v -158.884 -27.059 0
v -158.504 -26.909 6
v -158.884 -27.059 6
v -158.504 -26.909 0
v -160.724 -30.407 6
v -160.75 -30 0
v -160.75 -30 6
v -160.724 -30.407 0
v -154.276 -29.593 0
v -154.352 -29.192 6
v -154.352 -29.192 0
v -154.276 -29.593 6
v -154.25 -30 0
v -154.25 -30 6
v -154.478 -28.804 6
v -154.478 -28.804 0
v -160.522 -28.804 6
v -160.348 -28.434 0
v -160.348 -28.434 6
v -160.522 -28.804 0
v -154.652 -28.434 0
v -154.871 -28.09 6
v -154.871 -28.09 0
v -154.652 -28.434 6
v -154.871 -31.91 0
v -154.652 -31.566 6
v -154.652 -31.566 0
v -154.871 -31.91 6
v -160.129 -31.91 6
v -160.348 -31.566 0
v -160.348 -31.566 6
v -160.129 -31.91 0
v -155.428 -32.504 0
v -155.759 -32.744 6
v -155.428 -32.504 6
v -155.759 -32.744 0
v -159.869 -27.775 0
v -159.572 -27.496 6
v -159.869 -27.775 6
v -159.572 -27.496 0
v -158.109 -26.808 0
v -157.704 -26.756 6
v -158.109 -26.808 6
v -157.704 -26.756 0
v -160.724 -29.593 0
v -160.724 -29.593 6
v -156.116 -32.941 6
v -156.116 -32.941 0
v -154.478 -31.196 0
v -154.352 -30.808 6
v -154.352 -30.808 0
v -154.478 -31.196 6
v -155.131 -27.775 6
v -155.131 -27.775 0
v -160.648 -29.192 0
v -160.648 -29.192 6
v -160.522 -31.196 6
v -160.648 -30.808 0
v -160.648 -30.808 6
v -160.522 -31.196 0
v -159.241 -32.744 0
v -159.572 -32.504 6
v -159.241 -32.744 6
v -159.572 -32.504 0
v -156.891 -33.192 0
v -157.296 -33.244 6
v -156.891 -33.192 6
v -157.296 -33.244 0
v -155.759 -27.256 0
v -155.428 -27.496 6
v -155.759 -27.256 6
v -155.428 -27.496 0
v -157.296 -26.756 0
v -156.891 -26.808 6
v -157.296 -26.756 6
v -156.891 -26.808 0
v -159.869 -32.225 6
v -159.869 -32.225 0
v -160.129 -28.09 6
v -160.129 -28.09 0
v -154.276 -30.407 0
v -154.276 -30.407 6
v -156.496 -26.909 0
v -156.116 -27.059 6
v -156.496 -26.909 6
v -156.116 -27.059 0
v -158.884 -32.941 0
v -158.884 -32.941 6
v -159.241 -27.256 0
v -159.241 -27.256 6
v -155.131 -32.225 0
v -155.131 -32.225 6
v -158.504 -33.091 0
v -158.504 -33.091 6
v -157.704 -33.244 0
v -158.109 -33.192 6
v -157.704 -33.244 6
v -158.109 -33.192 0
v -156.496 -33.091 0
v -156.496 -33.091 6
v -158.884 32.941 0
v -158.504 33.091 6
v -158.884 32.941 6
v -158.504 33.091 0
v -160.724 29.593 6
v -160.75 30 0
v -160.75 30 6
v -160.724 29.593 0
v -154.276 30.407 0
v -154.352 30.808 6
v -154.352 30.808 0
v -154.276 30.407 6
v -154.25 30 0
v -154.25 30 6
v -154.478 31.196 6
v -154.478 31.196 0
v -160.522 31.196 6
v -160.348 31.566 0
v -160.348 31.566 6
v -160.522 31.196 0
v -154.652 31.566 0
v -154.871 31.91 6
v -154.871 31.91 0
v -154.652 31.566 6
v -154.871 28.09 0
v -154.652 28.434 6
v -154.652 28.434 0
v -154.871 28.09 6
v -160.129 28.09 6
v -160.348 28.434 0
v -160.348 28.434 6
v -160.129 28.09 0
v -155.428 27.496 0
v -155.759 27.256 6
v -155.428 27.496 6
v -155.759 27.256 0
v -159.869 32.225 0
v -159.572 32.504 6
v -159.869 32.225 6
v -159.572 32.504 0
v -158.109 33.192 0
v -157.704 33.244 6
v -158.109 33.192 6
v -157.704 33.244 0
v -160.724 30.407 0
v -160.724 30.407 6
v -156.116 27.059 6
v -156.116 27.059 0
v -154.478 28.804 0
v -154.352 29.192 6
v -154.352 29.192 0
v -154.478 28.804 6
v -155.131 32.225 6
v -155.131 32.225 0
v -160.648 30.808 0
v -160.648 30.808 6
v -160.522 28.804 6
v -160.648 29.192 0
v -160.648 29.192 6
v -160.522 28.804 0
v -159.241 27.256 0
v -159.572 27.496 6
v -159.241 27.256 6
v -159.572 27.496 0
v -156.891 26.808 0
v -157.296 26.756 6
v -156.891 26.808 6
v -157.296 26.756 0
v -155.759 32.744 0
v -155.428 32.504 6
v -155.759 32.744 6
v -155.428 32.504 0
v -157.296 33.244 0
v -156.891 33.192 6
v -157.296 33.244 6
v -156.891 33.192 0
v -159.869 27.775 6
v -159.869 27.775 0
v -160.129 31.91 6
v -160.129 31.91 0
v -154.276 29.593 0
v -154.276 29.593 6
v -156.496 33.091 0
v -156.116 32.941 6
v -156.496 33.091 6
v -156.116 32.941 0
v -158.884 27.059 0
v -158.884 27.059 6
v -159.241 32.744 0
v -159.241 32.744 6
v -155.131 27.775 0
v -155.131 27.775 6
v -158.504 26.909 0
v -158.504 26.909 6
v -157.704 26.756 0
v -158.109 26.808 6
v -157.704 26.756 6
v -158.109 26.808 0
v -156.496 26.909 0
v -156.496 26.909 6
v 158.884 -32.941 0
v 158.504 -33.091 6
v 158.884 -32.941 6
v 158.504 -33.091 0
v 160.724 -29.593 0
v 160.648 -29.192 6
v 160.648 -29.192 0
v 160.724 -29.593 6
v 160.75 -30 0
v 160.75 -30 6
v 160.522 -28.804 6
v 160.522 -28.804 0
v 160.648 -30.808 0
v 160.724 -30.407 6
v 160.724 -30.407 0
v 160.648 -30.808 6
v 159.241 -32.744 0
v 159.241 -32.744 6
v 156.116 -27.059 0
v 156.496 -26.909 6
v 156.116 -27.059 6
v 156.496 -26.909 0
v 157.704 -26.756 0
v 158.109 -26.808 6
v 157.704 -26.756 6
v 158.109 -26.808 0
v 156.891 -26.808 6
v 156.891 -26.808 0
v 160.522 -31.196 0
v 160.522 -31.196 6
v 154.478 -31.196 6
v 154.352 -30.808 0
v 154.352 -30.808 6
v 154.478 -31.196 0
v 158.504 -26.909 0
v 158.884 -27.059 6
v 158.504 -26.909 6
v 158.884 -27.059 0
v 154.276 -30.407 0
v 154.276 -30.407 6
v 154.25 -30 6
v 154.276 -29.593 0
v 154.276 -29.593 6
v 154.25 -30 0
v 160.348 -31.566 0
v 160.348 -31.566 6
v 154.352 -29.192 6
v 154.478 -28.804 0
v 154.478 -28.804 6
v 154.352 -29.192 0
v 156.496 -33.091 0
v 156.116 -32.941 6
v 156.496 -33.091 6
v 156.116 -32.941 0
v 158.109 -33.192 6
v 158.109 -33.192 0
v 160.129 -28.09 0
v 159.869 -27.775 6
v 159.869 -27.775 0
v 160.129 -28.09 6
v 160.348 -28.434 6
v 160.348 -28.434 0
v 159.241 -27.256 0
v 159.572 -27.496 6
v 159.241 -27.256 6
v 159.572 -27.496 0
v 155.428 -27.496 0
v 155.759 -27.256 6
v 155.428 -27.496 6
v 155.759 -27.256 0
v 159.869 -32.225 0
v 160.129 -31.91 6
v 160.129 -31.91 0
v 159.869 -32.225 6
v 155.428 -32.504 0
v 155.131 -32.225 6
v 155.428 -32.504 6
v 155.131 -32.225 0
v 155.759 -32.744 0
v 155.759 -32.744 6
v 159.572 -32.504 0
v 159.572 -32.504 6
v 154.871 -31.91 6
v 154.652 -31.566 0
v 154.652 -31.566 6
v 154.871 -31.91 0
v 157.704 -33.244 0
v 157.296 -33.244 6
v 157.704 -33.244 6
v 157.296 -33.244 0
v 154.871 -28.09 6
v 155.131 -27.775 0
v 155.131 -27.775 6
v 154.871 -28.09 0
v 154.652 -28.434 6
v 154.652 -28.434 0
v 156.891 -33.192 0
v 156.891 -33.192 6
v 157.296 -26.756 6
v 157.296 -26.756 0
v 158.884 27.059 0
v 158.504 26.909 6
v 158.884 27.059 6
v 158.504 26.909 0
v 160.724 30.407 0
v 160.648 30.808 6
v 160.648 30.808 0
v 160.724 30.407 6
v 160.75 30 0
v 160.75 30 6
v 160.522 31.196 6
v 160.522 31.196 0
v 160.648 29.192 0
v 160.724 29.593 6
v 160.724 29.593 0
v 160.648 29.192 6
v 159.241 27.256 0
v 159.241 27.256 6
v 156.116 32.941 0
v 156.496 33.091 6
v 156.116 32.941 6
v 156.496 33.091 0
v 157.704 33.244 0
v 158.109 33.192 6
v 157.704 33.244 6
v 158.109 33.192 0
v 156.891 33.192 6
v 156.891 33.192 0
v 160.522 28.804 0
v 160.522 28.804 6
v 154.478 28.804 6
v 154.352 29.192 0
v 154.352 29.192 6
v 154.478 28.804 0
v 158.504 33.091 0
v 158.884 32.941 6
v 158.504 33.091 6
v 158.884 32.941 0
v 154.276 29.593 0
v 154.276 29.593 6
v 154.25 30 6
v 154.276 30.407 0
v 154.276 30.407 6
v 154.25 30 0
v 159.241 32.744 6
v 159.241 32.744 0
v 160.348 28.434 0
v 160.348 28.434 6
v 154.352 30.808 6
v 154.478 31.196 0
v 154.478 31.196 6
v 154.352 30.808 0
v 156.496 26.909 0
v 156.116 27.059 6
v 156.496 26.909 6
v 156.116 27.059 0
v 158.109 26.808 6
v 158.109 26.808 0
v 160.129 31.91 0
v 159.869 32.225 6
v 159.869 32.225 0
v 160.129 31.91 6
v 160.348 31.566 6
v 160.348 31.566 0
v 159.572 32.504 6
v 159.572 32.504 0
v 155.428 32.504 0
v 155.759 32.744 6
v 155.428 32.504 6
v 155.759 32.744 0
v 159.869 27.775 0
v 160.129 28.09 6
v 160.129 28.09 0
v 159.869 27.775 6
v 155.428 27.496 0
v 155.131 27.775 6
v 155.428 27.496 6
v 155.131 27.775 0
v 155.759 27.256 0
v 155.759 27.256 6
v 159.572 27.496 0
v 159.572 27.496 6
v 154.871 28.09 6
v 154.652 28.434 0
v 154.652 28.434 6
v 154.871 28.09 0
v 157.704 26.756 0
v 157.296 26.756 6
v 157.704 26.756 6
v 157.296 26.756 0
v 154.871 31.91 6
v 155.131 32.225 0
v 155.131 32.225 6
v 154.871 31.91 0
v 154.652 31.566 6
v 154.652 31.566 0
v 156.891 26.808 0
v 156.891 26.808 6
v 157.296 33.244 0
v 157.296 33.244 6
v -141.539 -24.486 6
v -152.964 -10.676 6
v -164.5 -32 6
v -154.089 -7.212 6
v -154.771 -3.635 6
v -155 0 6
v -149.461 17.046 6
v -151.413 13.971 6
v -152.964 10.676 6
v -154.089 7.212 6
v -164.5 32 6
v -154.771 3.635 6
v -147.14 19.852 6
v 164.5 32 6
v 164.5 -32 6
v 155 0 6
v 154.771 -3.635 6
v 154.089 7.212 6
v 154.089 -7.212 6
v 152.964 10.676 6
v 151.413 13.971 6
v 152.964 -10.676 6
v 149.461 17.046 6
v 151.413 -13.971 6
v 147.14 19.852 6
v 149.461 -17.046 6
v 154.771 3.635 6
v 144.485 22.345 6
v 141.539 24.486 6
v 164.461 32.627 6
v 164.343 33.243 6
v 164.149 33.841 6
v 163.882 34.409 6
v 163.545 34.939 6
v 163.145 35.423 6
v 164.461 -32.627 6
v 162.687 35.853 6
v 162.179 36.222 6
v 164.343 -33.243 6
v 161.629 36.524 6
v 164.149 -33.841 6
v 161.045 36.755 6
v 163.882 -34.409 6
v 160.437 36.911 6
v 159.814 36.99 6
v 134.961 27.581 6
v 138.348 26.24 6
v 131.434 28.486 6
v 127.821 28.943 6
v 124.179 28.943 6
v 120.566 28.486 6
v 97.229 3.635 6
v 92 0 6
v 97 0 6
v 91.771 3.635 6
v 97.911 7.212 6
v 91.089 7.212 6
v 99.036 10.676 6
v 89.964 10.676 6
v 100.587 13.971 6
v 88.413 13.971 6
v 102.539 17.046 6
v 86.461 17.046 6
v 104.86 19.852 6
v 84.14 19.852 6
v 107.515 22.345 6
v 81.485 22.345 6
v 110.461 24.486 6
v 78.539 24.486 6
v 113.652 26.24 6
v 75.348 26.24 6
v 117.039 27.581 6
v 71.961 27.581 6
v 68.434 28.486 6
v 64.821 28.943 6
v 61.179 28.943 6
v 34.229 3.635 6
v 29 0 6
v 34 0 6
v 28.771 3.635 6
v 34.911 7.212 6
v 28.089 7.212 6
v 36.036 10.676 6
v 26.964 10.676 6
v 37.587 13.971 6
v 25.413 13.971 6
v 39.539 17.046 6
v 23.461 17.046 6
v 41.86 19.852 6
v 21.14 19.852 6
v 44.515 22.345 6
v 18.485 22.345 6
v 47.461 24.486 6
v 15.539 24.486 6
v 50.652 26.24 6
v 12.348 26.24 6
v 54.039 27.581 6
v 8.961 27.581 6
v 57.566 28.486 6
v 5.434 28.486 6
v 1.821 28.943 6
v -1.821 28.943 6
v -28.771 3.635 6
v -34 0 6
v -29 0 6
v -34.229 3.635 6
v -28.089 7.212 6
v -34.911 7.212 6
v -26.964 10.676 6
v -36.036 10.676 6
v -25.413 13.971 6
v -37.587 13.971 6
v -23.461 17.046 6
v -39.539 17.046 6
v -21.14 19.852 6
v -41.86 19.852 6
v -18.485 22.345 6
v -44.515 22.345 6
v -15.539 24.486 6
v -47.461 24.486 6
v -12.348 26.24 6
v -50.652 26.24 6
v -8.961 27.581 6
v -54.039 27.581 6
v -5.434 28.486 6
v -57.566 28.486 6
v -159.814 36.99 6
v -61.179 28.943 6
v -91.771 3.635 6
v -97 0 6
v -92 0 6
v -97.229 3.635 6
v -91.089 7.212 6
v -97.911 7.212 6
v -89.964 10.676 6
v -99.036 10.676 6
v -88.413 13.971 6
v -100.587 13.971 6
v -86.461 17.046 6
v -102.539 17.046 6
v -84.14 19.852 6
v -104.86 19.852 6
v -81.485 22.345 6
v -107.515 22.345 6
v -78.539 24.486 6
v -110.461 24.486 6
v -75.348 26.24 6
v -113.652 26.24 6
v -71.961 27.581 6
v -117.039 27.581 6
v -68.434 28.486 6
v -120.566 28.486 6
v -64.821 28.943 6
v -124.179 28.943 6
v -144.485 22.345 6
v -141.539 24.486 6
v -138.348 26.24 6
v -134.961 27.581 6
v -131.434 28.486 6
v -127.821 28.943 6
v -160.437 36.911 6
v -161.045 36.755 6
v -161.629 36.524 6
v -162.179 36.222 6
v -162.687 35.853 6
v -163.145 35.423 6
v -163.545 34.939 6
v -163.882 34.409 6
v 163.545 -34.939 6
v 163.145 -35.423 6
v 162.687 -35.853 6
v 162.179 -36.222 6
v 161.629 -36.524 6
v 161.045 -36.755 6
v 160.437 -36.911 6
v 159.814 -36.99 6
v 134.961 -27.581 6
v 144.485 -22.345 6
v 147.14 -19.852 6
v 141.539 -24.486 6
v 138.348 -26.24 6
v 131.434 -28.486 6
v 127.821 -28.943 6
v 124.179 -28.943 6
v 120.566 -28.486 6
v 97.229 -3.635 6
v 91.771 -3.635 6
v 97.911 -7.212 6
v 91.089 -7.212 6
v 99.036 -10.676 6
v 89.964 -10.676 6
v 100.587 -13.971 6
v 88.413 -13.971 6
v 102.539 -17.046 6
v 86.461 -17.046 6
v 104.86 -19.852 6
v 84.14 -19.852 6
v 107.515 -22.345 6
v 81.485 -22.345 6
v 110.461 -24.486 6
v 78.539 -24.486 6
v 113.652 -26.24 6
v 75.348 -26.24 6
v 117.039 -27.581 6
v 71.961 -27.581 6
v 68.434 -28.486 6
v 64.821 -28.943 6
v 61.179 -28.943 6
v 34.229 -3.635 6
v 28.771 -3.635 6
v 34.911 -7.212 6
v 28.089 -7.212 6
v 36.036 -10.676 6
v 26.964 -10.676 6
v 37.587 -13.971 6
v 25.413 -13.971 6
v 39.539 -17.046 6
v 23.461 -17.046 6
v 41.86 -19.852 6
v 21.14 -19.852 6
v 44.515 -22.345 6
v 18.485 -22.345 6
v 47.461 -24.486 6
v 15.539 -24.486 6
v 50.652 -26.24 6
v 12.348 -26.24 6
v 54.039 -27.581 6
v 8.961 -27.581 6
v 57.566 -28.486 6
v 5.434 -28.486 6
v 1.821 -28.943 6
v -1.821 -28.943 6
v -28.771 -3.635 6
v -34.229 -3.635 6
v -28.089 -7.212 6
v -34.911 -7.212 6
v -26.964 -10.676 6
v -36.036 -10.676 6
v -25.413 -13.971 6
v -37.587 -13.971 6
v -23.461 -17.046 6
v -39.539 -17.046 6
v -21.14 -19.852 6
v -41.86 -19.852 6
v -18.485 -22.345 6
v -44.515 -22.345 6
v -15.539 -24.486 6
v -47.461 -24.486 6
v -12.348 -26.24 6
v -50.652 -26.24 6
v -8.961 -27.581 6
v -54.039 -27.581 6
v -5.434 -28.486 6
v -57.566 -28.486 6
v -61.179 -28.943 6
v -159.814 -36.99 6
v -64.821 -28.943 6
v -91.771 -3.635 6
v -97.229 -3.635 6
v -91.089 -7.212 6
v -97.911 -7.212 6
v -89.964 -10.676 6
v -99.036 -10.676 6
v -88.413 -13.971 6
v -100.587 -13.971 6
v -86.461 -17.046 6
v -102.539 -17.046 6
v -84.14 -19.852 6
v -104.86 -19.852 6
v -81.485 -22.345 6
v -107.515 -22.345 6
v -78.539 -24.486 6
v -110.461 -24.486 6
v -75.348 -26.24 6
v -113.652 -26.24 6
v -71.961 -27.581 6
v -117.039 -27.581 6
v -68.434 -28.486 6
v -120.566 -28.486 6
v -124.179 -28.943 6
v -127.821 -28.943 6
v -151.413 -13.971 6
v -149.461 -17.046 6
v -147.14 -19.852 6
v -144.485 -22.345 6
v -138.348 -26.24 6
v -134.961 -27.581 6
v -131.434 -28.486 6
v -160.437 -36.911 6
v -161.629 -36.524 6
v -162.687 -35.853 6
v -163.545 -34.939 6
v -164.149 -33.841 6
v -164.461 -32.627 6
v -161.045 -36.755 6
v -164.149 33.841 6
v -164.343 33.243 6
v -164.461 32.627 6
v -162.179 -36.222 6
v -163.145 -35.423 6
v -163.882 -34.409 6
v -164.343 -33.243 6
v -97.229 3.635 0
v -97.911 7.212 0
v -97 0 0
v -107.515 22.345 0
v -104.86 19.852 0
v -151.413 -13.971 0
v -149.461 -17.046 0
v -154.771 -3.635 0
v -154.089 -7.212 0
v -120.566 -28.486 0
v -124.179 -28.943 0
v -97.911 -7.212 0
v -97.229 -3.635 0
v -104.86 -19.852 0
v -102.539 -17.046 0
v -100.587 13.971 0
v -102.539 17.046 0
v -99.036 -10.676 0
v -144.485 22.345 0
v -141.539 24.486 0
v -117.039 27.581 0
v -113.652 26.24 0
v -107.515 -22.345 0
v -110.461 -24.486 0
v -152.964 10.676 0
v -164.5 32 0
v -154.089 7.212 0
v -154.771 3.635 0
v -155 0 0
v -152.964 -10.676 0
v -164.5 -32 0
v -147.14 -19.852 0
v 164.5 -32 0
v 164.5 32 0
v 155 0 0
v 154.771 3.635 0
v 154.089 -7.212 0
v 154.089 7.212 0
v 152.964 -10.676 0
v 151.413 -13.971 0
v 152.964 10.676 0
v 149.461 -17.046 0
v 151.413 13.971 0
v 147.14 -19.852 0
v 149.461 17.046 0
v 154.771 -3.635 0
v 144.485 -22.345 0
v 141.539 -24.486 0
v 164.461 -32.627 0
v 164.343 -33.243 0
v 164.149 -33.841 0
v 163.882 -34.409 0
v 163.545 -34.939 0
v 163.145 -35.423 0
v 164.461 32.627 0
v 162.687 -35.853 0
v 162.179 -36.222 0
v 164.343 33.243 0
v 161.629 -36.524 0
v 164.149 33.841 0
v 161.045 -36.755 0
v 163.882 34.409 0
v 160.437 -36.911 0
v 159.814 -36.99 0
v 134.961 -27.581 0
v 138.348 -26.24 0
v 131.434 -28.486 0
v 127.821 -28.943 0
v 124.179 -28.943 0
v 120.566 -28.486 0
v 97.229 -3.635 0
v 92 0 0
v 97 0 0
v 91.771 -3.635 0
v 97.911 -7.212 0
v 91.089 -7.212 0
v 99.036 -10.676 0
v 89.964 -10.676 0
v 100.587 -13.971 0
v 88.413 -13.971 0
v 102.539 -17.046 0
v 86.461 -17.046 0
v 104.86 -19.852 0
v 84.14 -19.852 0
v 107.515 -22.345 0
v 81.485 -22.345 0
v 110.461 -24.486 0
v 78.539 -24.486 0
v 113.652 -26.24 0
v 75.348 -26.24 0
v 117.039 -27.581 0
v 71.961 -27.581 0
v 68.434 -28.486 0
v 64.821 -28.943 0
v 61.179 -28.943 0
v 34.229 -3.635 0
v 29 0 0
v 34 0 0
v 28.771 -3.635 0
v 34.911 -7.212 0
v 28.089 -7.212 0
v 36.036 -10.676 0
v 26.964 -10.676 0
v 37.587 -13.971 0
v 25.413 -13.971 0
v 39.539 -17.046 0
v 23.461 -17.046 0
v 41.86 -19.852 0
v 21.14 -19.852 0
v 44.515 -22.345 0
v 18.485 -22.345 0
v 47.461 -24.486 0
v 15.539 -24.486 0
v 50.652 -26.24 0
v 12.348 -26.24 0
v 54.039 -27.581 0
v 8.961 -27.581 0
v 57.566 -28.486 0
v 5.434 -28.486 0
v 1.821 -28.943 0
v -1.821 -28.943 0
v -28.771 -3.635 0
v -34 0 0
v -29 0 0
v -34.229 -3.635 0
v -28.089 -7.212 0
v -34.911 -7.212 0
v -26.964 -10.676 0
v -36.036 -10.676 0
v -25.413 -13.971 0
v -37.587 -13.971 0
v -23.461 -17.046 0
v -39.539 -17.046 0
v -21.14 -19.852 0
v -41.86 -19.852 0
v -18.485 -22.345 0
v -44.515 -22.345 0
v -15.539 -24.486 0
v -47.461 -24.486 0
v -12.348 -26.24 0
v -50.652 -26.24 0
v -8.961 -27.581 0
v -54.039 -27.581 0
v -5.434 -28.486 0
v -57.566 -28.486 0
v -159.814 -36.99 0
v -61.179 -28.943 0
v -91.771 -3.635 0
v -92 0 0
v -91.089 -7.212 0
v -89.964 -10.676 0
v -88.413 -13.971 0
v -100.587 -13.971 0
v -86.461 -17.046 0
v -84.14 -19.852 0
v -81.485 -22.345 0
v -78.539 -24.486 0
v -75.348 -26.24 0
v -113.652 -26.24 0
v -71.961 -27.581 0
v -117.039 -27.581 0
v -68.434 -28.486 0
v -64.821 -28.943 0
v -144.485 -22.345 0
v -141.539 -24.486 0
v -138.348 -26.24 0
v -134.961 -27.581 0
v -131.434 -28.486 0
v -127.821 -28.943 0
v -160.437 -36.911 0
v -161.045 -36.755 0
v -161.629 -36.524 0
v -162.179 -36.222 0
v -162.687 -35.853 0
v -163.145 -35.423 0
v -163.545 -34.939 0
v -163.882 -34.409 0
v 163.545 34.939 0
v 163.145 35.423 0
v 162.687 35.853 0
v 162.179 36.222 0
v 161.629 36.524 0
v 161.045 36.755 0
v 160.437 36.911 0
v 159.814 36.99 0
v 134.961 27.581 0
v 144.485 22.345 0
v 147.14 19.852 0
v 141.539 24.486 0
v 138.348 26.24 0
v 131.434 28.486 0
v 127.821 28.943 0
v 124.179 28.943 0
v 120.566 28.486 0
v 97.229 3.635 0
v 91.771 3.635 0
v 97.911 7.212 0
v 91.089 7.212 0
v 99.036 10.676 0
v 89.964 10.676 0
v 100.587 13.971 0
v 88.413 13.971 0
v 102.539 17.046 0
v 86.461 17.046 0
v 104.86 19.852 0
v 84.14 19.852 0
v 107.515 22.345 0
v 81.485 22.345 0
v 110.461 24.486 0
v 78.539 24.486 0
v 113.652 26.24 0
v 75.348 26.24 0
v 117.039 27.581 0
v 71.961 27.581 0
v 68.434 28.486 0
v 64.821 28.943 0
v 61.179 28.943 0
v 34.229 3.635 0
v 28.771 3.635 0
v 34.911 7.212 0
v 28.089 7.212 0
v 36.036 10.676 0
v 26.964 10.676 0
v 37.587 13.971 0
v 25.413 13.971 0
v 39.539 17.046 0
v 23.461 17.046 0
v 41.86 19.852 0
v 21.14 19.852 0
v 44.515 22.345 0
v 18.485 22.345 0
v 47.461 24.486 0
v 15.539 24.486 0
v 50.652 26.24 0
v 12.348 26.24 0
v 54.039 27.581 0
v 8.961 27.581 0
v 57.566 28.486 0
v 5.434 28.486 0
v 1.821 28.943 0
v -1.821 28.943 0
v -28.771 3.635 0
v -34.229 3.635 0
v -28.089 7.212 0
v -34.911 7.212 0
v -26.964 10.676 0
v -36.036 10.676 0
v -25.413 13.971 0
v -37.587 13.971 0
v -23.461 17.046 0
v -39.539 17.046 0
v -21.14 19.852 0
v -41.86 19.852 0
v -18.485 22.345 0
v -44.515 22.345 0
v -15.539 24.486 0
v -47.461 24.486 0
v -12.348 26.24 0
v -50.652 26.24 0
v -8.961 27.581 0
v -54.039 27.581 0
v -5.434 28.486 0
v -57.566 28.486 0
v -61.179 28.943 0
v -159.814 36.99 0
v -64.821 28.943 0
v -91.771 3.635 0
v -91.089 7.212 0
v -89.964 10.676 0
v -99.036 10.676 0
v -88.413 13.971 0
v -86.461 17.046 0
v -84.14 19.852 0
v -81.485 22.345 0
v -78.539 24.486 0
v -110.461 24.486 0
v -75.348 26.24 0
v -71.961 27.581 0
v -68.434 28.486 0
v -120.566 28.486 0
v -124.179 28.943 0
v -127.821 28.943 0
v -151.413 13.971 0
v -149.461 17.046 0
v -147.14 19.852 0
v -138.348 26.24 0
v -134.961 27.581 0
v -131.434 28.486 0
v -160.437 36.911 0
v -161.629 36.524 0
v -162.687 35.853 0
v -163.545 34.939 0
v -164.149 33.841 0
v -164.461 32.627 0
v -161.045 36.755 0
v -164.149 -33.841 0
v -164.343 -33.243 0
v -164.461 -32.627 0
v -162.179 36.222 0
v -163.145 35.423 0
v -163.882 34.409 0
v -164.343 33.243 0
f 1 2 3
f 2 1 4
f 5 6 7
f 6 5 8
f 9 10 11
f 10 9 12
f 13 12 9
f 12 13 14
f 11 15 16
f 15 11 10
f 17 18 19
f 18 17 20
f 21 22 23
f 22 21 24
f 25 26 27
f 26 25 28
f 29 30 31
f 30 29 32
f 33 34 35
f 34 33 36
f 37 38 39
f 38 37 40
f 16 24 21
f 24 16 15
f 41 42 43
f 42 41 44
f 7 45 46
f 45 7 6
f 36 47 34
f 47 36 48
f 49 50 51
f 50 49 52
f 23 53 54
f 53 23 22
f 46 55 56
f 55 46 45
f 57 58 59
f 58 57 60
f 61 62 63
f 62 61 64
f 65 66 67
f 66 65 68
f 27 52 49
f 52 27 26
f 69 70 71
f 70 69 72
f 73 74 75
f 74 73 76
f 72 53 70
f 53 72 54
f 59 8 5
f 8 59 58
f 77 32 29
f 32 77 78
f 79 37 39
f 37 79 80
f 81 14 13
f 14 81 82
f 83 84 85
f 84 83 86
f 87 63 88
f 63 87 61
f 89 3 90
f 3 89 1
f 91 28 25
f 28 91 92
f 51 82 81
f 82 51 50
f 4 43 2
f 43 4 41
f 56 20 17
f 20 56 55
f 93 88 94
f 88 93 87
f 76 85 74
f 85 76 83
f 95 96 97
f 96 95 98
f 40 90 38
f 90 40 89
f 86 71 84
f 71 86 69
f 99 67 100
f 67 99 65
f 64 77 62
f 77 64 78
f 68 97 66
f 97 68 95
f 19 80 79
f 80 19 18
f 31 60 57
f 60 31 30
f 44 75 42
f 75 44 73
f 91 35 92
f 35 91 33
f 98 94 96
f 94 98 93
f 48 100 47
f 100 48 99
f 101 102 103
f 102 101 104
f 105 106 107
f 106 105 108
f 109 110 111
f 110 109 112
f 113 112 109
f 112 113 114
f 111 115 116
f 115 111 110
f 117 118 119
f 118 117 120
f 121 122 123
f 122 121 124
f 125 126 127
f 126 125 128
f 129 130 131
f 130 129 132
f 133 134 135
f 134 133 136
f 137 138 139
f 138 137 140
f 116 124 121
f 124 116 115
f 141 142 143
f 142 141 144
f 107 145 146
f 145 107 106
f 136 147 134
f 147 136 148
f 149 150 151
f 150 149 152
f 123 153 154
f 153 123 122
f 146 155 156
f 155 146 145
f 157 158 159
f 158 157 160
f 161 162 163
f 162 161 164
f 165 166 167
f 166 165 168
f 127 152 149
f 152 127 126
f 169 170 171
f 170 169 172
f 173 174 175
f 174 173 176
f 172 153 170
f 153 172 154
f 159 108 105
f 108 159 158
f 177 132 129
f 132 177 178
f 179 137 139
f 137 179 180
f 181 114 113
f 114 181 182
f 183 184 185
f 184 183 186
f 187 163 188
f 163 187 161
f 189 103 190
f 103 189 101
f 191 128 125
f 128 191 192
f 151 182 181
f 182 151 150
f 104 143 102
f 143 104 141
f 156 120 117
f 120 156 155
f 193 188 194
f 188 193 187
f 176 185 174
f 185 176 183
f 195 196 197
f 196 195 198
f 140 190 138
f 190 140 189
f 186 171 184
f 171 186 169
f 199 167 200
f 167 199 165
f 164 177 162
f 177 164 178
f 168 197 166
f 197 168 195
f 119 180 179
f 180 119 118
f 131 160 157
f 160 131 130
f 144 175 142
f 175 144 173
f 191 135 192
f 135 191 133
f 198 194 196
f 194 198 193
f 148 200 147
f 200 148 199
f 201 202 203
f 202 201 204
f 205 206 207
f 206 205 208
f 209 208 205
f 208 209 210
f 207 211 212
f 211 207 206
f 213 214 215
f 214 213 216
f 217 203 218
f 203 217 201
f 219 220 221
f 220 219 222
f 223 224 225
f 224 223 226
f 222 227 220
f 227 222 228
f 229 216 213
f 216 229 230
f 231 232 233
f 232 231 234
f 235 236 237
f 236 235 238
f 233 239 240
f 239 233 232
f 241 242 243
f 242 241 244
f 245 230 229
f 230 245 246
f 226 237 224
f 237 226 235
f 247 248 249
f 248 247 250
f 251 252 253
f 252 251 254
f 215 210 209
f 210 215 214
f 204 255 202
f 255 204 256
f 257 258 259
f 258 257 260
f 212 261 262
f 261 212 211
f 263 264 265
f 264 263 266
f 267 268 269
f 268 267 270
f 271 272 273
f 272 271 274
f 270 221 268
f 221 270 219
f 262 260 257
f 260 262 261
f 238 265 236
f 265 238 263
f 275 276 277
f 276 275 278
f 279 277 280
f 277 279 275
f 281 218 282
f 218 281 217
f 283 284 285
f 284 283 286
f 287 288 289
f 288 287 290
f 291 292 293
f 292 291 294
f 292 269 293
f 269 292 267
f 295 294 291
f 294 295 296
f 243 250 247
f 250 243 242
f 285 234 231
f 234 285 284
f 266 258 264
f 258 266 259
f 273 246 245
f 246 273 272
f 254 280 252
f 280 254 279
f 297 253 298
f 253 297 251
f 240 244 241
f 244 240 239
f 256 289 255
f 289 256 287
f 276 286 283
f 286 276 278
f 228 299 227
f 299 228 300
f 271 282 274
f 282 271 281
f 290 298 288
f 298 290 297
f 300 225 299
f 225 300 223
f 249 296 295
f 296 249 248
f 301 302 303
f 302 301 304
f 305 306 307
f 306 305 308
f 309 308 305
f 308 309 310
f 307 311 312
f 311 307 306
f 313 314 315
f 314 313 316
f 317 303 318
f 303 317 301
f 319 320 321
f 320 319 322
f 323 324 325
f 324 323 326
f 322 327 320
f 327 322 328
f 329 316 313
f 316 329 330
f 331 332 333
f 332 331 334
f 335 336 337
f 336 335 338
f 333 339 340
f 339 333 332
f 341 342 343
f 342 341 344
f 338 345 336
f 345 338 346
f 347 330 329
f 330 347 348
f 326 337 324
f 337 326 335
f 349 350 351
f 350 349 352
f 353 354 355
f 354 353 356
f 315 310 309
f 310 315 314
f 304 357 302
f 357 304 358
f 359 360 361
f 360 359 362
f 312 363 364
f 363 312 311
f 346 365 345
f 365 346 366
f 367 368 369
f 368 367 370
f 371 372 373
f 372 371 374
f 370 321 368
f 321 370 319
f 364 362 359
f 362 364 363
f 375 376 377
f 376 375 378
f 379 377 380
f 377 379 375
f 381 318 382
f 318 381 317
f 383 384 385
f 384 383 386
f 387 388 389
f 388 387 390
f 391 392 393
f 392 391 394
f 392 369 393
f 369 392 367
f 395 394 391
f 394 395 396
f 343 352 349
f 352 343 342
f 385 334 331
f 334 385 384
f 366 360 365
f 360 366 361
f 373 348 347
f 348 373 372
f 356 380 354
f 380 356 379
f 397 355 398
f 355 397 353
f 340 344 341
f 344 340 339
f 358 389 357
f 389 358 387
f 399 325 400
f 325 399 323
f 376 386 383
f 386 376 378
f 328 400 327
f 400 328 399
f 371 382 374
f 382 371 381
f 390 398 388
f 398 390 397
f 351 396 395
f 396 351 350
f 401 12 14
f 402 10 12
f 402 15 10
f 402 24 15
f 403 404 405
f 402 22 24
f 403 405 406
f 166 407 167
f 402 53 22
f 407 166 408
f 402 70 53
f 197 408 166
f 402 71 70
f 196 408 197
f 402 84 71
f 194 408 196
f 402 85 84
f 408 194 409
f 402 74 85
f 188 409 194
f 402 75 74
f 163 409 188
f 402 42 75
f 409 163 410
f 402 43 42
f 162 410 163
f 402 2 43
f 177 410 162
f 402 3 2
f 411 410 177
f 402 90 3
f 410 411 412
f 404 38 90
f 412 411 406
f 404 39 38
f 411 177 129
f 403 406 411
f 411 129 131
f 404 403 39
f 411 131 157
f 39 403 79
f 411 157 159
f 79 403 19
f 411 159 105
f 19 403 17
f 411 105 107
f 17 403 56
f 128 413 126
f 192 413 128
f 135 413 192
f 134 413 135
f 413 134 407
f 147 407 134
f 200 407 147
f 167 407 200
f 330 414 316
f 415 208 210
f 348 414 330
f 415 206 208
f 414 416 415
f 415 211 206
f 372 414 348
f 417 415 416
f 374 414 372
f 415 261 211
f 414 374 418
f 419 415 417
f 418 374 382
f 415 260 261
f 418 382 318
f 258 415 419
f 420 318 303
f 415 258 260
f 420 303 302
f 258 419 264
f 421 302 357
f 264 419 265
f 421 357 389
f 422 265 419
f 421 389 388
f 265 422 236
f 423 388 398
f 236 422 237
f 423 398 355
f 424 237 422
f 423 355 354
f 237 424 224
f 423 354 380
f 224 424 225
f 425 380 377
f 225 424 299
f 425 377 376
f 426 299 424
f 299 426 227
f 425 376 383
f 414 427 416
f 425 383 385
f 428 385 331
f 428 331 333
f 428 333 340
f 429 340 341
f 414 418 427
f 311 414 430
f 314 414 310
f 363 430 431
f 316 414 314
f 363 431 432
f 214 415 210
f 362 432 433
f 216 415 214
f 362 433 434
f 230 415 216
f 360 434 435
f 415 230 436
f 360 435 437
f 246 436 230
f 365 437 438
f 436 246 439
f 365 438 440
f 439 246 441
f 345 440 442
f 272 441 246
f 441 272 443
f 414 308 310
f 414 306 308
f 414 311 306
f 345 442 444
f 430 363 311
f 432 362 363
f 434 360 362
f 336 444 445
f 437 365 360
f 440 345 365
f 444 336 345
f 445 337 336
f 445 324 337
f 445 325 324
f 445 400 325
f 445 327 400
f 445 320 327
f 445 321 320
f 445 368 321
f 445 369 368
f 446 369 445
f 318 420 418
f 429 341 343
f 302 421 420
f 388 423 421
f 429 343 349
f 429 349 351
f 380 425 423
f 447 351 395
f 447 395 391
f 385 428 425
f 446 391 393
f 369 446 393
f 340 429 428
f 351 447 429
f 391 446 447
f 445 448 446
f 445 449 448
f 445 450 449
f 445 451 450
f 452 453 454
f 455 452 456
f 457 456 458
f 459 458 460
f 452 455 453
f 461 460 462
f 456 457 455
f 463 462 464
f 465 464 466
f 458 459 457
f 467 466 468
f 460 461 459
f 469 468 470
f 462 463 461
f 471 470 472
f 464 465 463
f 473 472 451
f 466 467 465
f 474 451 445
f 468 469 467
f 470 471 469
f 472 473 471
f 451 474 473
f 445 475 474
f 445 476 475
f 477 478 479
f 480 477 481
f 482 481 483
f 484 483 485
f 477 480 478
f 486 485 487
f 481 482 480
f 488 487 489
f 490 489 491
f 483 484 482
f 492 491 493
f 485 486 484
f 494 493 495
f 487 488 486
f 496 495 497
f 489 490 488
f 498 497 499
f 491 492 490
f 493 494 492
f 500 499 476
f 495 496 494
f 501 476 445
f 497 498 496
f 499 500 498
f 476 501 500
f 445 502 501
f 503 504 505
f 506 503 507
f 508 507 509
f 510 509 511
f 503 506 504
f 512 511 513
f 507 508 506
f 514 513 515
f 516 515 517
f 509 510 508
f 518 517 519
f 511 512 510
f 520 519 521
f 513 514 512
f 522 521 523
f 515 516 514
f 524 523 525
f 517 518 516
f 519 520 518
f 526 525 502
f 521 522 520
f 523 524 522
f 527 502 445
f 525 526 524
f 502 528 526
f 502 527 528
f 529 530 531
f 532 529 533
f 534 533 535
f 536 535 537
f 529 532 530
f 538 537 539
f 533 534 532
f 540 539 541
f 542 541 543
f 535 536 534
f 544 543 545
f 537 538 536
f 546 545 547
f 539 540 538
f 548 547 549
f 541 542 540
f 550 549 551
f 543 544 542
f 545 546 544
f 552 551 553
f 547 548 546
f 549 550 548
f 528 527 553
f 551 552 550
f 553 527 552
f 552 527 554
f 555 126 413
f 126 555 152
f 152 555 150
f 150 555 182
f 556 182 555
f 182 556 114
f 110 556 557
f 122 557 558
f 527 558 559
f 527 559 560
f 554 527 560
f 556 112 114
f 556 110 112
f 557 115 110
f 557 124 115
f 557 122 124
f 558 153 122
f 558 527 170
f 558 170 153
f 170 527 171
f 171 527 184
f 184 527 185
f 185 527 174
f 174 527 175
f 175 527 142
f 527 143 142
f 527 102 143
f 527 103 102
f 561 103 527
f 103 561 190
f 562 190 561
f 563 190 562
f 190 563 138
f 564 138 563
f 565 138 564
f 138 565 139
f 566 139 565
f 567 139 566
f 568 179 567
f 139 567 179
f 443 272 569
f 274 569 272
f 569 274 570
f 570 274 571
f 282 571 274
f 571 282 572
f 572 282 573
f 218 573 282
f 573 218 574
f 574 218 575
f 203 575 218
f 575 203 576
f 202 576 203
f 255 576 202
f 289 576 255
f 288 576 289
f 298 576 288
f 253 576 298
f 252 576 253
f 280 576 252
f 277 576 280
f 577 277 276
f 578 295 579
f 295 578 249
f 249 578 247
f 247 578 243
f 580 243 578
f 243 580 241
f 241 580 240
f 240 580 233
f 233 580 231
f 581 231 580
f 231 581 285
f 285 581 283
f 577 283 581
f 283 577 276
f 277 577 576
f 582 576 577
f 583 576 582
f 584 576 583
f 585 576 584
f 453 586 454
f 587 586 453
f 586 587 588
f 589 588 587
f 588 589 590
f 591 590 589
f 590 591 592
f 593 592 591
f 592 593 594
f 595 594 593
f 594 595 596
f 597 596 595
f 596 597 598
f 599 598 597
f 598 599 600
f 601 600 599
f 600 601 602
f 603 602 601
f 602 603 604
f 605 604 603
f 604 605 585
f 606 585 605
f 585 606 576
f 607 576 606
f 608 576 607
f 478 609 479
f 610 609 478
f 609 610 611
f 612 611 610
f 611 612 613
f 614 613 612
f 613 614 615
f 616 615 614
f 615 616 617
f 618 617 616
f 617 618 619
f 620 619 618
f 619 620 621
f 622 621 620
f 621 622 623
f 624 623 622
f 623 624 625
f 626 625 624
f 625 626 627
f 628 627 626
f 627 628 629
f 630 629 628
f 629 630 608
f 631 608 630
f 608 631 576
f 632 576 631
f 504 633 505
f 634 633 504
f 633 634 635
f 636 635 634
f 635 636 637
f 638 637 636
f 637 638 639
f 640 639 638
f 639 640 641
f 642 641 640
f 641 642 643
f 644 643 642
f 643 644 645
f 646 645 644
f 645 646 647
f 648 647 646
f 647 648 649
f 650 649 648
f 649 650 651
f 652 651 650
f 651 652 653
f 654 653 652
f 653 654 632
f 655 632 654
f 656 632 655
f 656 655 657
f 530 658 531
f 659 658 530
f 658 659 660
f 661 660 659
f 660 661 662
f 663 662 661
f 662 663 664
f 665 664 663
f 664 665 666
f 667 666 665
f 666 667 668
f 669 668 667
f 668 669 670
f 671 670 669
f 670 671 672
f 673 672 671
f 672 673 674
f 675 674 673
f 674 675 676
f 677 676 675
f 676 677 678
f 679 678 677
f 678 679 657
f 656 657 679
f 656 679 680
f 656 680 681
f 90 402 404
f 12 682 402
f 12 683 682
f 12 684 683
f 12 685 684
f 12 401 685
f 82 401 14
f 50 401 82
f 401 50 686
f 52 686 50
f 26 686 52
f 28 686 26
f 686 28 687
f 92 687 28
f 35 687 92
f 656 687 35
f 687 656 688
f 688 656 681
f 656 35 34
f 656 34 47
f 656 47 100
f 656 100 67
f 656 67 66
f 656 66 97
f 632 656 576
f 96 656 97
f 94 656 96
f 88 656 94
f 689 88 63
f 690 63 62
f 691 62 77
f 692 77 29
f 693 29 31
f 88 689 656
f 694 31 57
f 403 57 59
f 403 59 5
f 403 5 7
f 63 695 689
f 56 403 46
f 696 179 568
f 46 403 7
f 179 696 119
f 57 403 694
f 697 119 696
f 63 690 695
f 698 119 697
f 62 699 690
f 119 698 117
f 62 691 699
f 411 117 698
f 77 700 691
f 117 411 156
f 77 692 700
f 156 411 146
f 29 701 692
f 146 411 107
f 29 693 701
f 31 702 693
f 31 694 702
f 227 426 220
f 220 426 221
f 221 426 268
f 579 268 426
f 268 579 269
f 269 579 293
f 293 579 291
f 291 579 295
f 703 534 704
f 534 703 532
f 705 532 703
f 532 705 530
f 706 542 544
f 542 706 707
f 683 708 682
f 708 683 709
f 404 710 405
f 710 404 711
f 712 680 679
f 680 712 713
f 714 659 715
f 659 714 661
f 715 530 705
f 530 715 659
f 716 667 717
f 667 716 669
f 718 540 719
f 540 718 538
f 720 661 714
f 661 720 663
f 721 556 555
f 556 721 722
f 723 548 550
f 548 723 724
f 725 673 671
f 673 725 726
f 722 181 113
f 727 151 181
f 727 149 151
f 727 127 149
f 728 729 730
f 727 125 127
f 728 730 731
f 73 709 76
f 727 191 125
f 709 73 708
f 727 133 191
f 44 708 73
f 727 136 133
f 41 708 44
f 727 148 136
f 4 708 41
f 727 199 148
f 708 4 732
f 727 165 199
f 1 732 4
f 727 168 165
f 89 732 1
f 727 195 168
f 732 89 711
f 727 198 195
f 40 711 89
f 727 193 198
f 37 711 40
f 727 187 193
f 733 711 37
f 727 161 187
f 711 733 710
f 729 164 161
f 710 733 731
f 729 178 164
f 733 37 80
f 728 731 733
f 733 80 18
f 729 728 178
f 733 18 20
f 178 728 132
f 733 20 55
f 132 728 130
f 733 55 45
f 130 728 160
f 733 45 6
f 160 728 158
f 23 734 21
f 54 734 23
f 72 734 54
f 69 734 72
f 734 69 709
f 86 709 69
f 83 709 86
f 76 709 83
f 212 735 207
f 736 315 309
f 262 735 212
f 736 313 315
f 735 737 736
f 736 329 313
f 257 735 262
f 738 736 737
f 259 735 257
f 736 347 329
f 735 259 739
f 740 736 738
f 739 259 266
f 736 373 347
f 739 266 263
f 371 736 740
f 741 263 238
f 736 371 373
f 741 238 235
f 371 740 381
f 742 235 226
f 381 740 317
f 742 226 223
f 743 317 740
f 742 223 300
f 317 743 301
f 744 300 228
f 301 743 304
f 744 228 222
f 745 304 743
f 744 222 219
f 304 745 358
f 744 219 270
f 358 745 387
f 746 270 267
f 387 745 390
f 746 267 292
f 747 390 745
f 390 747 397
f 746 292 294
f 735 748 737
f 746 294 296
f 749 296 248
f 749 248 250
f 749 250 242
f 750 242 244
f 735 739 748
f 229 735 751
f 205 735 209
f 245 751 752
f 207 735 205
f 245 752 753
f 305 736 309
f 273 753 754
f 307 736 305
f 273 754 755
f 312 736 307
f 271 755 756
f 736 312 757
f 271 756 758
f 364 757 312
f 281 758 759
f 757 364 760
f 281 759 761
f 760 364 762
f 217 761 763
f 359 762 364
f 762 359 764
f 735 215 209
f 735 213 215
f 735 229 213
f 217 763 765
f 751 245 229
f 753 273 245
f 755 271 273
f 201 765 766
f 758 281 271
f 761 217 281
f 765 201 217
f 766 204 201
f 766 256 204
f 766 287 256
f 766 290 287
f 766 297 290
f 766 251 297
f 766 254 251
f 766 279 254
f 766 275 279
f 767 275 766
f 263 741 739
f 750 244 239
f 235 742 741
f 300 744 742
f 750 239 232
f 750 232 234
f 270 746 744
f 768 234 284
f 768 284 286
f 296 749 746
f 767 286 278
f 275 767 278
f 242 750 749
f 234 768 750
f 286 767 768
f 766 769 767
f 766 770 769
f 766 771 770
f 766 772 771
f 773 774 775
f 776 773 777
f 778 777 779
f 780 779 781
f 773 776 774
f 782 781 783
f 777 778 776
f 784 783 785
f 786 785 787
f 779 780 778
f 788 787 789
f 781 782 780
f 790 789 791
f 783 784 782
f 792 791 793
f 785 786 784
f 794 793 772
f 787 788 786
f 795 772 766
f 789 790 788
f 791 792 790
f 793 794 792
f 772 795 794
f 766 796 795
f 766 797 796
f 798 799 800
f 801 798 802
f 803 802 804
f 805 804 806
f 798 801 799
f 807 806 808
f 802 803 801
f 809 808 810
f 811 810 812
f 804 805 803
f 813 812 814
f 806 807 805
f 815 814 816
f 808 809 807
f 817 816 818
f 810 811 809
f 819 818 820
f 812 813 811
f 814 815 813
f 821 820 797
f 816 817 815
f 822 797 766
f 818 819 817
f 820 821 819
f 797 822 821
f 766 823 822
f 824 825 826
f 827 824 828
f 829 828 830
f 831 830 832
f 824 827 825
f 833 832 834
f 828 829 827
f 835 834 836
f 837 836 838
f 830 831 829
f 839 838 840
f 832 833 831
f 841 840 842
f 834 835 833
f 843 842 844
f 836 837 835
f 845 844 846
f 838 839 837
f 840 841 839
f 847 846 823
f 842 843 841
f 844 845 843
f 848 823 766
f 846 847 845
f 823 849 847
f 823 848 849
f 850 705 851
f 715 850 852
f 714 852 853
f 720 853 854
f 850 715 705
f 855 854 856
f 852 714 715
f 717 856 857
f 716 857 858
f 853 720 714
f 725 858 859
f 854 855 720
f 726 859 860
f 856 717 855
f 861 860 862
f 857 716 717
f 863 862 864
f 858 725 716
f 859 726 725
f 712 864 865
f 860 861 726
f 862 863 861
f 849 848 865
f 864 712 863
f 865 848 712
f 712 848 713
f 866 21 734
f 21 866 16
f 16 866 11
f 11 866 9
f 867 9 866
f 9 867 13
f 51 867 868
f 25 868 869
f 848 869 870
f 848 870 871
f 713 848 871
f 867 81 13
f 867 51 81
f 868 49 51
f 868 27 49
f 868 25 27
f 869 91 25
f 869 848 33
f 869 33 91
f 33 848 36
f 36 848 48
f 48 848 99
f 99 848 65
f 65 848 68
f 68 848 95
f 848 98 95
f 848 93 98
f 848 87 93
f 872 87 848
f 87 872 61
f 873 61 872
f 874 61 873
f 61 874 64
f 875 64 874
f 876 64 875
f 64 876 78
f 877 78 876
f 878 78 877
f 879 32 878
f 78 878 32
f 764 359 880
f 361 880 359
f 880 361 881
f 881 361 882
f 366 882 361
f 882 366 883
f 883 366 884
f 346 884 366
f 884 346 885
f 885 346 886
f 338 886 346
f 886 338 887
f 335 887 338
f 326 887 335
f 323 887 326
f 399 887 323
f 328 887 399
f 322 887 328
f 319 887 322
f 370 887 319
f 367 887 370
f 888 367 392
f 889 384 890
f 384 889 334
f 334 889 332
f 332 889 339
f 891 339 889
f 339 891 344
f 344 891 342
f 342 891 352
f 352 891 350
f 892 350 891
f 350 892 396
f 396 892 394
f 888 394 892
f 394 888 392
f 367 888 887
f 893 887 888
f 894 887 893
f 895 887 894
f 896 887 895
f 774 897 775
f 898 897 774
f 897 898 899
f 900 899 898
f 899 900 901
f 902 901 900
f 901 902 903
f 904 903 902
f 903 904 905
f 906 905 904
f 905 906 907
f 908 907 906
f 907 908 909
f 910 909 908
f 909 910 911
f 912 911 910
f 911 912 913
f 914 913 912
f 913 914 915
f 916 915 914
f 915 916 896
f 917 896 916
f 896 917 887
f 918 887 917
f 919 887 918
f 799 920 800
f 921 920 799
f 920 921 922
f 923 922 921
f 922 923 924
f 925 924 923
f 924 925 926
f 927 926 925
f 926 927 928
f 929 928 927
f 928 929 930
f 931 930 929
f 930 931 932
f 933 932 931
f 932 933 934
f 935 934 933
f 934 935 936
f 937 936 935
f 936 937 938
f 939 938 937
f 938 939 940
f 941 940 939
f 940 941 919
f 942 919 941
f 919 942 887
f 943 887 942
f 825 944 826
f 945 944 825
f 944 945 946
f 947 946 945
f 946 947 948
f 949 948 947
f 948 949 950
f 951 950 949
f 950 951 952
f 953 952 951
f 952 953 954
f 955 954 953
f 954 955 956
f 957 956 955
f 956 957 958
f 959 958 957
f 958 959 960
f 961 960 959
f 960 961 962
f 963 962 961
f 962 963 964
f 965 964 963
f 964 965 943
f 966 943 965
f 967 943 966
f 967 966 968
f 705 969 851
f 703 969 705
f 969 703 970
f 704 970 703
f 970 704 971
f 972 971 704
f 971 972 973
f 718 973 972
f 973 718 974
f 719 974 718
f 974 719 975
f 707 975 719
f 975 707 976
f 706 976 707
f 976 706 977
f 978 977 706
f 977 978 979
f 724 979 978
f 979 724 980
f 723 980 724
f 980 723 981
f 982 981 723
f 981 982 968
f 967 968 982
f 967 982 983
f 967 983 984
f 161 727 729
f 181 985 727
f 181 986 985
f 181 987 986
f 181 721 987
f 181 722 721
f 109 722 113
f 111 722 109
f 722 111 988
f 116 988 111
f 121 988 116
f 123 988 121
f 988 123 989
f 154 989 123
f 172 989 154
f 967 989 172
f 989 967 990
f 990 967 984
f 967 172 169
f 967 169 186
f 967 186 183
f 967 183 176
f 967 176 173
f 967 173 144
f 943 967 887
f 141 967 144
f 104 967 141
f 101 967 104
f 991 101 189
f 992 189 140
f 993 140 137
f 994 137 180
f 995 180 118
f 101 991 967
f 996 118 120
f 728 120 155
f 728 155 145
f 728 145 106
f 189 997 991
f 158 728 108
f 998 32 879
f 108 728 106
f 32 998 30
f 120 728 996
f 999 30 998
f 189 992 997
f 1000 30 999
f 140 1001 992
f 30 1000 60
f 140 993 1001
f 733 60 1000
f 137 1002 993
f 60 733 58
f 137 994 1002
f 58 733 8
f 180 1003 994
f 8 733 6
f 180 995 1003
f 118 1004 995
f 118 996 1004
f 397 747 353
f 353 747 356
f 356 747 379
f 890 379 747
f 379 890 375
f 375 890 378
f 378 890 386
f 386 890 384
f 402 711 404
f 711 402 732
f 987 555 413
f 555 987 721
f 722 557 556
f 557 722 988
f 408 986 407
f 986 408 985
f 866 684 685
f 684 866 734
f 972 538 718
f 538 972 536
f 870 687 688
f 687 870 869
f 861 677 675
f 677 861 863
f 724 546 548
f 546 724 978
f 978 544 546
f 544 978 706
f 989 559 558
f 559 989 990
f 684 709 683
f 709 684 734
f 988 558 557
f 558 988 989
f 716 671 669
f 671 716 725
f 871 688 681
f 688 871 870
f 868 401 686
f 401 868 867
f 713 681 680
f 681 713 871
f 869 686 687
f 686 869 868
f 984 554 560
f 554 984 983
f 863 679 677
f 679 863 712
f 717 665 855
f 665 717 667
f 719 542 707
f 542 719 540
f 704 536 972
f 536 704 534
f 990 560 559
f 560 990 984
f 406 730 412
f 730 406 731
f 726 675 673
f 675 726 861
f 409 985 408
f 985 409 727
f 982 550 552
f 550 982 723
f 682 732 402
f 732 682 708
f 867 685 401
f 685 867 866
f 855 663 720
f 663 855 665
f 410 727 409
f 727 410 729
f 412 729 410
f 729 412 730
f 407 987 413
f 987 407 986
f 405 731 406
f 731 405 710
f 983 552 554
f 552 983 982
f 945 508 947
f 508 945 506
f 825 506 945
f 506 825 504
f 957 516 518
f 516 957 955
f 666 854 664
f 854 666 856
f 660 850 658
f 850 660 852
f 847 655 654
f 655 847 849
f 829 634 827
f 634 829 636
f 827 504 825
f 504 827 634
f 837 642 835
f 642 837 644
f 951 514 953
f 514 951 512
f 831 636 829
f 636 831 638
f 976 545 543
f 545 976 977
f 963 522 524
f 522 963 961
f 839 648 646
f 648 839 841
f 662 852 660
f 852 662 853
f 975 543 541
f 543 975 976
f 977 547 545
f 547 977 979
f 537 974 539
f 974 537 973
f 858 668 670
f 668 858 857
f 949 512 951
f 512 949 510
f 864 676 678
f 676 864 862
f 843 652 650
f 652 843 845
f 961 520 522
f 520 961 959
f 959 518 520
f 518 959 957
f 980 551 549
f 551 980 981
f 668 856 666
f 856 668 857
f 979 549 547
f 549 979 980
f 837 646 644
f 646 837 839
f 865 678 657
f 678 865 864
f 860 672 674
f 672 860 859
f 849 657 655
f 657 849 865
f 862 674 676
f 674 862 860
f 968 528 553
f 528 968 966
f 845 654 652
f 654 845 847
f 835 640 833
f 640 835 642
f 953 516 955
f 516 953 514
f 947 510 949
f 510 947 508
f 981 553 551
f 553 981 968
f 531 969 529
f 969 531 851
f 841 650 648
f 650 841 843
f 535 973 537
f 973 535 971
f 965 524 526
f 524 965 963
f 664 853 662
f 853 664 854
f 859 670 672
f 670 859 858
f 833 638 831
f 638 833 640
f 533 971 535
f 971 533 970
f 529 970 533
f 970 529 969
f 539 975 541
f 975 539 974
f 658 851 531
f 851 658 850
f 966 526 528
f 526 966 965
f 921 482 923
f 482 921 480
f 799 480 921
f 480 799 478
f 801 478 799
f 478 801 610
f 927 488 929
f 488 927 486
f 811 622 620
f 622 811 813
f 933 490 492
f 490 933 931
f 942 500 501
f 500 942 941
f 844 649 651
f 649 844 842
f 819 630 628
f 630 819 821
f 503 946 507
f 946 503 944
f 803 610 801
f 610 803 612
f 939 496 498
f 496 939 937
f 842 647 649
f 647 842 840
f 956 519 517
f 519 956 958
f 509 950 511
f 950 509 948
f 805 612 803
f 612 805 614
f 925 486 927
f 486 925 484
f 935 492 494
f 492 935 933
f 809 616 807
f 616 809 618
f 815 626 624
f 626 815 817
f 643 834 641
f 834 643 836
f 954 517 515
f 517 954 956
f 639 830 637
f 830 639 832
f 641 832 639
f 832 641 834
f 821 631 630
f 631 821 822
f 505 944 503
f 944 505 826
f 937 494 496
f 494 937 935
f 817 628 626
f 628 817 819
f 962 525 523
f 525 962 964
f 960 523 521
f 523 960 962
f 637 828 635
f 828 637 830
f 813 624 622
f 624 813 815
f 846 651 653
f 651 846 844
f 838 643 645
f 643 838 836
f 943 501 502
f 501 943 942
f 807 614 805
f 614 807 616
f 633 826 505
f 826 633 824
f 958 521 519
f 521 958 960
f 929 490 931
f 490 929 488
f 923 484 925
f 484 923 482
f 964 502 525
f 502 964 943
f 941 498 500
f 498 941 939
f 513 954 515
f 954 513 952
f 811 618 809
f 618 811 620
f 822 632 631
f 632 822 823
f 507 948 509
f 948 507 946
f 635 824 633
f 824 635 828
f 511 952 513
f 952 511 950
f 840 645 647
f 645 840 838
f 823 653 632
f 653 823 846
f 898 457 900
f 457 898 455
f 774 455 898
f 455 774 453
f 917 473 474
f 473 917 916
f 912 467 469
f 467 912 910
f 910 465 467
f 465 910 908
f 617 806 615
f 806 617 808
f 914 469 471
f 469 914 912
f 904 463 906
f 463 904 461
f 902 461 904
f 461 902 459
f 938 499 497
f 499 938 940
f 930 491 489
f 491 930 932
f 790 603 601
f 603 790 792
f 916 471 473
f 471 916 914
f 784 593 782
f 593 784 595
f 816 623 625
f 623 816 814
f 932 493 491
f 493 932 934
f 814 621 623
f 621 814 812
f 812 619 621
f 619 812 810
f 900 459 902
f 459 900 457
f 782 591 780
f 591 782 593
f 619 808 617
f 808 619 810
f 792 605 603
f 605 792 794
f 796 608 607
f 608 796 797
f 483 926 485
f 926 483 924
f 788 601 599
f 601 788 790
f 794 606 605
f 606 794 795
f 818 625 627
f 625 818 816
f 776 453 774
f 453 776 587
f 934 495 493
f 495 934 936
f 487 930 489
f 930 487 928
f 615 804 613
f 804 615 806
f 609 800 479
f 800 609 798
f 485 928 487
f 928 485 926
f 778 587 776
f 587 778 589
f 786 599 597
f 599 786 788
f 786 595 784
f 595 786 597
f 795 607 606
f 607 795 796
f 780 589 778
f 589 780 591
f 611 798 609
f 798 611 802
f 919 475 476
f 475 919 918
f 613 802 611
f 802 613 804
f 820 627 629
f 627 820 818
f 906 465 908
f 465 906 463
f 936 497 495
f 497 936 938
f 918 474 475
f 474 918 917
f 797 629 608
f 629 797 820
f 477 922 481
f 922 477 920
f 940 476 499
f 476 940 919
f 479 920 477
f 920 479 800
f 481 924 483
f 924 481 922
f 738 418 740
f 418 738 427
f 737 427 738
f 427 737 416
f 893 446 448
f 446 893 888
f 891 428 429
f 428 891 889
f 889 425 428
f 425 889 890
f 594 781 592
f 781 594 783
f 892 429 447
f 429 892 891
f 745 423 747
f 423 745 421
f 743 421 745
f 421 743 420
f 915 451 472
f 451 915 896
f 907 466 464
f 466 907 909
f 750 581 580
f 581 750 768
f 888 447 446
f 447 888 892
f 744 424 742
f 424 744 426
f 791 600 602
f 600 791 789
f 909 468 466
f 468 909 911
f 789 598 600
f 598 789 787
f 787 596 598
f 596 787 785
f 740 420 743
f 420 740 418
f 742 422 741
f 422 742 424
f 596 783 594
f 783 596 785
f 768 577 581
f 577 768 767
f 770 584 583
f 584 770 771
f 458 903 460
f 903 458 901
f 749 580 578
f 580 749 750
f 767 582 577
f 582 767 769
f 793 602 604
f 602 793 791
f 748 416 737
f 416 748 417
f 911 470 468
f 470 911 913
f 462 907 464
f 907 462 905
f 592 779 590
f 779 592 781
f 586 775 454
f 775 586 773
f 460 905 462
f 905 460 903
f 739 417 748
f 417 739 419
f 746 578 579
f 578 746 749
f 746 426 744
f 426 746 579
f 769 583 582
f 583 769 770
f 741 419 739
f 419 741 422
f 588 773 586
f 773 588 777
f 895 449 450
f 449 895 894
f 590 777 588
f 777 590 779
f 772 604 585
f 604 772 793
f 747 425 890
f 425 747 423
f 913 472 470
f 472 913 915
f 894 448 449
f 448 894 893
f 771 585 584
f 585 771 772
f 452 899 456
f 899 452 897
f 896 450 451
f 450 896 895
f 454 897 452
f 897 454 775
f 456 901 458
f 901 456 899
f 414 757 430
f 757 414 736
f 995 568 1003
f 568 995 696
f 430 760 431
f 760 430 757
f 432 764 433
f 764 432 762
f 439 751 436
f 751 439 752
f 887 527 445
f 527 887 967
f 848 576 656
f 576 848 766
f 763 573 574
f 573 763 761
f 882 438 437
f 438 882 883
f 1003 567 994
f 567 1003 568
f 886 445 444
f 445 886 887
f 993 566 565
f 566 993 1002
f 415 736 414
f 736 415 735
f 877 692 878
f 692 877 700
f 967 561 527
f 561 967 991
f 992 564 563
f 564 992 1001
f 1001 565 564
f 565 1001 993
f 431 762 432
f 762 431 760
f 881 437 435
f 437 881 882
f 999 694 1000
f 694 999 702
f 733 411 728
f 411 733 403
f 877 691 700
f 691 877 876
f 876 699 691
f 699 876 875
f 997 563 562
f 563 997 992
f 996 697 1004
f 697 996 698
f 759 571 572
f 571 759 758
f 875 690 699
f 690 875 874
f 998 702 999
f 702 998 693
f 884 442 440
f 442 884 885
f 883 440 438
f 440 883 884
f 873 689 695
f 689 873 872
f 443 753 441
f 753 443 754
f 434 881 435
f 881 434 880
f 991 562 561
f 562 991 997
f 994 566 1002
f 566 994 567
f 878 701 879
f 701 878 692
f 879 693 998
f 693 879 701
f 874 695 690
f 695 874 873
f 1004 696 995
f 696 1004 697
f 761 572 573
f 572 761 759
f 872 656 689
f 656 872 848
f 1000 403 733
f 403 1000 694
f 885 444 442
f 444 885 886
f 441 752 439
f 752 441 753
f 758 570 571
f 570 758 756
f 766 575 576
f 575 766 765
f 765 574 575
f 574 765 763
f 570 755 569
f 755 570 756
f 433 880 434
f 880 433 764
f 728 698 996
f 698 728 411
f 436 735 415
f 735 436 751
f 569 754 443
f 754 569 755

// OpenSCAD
$fn = 50;


difference() {
	union() {
		hull() {
			translate(v = [-159.5000000000, 32.0000000000, 0]) {
				cylinder(h = 6, r = 5);
			}
			translate(v = [159.5000000000, 32.0000000000, 0]) {
				cylinder(h = 6, r = 5);
			}
			translate(v = [-159.5000000000, -32.0000000000, 0]) {
				cylinder(h = 6, r = 5);
			}
			translate(v = [159.5000000000, -32.0000000000, 0]) {
				cylinder(h = 6, r = 5);
			}
		}
	}
	union() {
		#translate(v = [-157.5000000000, -30.0000000000, -100.0000000000]) {
			cylinder(h = 200, r = 3.2500000000);
		}
		#translate(v = [-157.5000000000, 30.0000000000, -100.0000000000]) {
			cylinder(h = 200, r = 3.2500000000);
		}
		#translate(v = [157.5000000000, -30.0000000000, -100.0000000000]) {
			cylinder(h = 200, r = 3.2500000000);
		}
		#translate(v = [157.5000000000, 30.0000000000, -100.0000000000]) {
			cylinder(h = 200, r = 3.2500000000);
		}
		#translate(v = [-126.0000000000, 0, 0]) {
			cylinder(h = 6, r = 29.0000000000);
		}
		#translate(v = [-63.0000000000, 0, 0]) {
			cylinder(h = 6, r = 29.0000000000);
		}
		#cylinder(h = 6, r = 29.0000000000);
		#translate(v = [63.0000000000, 0, 0]) {
			cylinder(h = 6, r = 29.0000000000);
		}
		#translate(v = [126.0000000000, 0, 0]) {
			cylinder(h = 6, r = 29.0000000000);
		}
	}
}
